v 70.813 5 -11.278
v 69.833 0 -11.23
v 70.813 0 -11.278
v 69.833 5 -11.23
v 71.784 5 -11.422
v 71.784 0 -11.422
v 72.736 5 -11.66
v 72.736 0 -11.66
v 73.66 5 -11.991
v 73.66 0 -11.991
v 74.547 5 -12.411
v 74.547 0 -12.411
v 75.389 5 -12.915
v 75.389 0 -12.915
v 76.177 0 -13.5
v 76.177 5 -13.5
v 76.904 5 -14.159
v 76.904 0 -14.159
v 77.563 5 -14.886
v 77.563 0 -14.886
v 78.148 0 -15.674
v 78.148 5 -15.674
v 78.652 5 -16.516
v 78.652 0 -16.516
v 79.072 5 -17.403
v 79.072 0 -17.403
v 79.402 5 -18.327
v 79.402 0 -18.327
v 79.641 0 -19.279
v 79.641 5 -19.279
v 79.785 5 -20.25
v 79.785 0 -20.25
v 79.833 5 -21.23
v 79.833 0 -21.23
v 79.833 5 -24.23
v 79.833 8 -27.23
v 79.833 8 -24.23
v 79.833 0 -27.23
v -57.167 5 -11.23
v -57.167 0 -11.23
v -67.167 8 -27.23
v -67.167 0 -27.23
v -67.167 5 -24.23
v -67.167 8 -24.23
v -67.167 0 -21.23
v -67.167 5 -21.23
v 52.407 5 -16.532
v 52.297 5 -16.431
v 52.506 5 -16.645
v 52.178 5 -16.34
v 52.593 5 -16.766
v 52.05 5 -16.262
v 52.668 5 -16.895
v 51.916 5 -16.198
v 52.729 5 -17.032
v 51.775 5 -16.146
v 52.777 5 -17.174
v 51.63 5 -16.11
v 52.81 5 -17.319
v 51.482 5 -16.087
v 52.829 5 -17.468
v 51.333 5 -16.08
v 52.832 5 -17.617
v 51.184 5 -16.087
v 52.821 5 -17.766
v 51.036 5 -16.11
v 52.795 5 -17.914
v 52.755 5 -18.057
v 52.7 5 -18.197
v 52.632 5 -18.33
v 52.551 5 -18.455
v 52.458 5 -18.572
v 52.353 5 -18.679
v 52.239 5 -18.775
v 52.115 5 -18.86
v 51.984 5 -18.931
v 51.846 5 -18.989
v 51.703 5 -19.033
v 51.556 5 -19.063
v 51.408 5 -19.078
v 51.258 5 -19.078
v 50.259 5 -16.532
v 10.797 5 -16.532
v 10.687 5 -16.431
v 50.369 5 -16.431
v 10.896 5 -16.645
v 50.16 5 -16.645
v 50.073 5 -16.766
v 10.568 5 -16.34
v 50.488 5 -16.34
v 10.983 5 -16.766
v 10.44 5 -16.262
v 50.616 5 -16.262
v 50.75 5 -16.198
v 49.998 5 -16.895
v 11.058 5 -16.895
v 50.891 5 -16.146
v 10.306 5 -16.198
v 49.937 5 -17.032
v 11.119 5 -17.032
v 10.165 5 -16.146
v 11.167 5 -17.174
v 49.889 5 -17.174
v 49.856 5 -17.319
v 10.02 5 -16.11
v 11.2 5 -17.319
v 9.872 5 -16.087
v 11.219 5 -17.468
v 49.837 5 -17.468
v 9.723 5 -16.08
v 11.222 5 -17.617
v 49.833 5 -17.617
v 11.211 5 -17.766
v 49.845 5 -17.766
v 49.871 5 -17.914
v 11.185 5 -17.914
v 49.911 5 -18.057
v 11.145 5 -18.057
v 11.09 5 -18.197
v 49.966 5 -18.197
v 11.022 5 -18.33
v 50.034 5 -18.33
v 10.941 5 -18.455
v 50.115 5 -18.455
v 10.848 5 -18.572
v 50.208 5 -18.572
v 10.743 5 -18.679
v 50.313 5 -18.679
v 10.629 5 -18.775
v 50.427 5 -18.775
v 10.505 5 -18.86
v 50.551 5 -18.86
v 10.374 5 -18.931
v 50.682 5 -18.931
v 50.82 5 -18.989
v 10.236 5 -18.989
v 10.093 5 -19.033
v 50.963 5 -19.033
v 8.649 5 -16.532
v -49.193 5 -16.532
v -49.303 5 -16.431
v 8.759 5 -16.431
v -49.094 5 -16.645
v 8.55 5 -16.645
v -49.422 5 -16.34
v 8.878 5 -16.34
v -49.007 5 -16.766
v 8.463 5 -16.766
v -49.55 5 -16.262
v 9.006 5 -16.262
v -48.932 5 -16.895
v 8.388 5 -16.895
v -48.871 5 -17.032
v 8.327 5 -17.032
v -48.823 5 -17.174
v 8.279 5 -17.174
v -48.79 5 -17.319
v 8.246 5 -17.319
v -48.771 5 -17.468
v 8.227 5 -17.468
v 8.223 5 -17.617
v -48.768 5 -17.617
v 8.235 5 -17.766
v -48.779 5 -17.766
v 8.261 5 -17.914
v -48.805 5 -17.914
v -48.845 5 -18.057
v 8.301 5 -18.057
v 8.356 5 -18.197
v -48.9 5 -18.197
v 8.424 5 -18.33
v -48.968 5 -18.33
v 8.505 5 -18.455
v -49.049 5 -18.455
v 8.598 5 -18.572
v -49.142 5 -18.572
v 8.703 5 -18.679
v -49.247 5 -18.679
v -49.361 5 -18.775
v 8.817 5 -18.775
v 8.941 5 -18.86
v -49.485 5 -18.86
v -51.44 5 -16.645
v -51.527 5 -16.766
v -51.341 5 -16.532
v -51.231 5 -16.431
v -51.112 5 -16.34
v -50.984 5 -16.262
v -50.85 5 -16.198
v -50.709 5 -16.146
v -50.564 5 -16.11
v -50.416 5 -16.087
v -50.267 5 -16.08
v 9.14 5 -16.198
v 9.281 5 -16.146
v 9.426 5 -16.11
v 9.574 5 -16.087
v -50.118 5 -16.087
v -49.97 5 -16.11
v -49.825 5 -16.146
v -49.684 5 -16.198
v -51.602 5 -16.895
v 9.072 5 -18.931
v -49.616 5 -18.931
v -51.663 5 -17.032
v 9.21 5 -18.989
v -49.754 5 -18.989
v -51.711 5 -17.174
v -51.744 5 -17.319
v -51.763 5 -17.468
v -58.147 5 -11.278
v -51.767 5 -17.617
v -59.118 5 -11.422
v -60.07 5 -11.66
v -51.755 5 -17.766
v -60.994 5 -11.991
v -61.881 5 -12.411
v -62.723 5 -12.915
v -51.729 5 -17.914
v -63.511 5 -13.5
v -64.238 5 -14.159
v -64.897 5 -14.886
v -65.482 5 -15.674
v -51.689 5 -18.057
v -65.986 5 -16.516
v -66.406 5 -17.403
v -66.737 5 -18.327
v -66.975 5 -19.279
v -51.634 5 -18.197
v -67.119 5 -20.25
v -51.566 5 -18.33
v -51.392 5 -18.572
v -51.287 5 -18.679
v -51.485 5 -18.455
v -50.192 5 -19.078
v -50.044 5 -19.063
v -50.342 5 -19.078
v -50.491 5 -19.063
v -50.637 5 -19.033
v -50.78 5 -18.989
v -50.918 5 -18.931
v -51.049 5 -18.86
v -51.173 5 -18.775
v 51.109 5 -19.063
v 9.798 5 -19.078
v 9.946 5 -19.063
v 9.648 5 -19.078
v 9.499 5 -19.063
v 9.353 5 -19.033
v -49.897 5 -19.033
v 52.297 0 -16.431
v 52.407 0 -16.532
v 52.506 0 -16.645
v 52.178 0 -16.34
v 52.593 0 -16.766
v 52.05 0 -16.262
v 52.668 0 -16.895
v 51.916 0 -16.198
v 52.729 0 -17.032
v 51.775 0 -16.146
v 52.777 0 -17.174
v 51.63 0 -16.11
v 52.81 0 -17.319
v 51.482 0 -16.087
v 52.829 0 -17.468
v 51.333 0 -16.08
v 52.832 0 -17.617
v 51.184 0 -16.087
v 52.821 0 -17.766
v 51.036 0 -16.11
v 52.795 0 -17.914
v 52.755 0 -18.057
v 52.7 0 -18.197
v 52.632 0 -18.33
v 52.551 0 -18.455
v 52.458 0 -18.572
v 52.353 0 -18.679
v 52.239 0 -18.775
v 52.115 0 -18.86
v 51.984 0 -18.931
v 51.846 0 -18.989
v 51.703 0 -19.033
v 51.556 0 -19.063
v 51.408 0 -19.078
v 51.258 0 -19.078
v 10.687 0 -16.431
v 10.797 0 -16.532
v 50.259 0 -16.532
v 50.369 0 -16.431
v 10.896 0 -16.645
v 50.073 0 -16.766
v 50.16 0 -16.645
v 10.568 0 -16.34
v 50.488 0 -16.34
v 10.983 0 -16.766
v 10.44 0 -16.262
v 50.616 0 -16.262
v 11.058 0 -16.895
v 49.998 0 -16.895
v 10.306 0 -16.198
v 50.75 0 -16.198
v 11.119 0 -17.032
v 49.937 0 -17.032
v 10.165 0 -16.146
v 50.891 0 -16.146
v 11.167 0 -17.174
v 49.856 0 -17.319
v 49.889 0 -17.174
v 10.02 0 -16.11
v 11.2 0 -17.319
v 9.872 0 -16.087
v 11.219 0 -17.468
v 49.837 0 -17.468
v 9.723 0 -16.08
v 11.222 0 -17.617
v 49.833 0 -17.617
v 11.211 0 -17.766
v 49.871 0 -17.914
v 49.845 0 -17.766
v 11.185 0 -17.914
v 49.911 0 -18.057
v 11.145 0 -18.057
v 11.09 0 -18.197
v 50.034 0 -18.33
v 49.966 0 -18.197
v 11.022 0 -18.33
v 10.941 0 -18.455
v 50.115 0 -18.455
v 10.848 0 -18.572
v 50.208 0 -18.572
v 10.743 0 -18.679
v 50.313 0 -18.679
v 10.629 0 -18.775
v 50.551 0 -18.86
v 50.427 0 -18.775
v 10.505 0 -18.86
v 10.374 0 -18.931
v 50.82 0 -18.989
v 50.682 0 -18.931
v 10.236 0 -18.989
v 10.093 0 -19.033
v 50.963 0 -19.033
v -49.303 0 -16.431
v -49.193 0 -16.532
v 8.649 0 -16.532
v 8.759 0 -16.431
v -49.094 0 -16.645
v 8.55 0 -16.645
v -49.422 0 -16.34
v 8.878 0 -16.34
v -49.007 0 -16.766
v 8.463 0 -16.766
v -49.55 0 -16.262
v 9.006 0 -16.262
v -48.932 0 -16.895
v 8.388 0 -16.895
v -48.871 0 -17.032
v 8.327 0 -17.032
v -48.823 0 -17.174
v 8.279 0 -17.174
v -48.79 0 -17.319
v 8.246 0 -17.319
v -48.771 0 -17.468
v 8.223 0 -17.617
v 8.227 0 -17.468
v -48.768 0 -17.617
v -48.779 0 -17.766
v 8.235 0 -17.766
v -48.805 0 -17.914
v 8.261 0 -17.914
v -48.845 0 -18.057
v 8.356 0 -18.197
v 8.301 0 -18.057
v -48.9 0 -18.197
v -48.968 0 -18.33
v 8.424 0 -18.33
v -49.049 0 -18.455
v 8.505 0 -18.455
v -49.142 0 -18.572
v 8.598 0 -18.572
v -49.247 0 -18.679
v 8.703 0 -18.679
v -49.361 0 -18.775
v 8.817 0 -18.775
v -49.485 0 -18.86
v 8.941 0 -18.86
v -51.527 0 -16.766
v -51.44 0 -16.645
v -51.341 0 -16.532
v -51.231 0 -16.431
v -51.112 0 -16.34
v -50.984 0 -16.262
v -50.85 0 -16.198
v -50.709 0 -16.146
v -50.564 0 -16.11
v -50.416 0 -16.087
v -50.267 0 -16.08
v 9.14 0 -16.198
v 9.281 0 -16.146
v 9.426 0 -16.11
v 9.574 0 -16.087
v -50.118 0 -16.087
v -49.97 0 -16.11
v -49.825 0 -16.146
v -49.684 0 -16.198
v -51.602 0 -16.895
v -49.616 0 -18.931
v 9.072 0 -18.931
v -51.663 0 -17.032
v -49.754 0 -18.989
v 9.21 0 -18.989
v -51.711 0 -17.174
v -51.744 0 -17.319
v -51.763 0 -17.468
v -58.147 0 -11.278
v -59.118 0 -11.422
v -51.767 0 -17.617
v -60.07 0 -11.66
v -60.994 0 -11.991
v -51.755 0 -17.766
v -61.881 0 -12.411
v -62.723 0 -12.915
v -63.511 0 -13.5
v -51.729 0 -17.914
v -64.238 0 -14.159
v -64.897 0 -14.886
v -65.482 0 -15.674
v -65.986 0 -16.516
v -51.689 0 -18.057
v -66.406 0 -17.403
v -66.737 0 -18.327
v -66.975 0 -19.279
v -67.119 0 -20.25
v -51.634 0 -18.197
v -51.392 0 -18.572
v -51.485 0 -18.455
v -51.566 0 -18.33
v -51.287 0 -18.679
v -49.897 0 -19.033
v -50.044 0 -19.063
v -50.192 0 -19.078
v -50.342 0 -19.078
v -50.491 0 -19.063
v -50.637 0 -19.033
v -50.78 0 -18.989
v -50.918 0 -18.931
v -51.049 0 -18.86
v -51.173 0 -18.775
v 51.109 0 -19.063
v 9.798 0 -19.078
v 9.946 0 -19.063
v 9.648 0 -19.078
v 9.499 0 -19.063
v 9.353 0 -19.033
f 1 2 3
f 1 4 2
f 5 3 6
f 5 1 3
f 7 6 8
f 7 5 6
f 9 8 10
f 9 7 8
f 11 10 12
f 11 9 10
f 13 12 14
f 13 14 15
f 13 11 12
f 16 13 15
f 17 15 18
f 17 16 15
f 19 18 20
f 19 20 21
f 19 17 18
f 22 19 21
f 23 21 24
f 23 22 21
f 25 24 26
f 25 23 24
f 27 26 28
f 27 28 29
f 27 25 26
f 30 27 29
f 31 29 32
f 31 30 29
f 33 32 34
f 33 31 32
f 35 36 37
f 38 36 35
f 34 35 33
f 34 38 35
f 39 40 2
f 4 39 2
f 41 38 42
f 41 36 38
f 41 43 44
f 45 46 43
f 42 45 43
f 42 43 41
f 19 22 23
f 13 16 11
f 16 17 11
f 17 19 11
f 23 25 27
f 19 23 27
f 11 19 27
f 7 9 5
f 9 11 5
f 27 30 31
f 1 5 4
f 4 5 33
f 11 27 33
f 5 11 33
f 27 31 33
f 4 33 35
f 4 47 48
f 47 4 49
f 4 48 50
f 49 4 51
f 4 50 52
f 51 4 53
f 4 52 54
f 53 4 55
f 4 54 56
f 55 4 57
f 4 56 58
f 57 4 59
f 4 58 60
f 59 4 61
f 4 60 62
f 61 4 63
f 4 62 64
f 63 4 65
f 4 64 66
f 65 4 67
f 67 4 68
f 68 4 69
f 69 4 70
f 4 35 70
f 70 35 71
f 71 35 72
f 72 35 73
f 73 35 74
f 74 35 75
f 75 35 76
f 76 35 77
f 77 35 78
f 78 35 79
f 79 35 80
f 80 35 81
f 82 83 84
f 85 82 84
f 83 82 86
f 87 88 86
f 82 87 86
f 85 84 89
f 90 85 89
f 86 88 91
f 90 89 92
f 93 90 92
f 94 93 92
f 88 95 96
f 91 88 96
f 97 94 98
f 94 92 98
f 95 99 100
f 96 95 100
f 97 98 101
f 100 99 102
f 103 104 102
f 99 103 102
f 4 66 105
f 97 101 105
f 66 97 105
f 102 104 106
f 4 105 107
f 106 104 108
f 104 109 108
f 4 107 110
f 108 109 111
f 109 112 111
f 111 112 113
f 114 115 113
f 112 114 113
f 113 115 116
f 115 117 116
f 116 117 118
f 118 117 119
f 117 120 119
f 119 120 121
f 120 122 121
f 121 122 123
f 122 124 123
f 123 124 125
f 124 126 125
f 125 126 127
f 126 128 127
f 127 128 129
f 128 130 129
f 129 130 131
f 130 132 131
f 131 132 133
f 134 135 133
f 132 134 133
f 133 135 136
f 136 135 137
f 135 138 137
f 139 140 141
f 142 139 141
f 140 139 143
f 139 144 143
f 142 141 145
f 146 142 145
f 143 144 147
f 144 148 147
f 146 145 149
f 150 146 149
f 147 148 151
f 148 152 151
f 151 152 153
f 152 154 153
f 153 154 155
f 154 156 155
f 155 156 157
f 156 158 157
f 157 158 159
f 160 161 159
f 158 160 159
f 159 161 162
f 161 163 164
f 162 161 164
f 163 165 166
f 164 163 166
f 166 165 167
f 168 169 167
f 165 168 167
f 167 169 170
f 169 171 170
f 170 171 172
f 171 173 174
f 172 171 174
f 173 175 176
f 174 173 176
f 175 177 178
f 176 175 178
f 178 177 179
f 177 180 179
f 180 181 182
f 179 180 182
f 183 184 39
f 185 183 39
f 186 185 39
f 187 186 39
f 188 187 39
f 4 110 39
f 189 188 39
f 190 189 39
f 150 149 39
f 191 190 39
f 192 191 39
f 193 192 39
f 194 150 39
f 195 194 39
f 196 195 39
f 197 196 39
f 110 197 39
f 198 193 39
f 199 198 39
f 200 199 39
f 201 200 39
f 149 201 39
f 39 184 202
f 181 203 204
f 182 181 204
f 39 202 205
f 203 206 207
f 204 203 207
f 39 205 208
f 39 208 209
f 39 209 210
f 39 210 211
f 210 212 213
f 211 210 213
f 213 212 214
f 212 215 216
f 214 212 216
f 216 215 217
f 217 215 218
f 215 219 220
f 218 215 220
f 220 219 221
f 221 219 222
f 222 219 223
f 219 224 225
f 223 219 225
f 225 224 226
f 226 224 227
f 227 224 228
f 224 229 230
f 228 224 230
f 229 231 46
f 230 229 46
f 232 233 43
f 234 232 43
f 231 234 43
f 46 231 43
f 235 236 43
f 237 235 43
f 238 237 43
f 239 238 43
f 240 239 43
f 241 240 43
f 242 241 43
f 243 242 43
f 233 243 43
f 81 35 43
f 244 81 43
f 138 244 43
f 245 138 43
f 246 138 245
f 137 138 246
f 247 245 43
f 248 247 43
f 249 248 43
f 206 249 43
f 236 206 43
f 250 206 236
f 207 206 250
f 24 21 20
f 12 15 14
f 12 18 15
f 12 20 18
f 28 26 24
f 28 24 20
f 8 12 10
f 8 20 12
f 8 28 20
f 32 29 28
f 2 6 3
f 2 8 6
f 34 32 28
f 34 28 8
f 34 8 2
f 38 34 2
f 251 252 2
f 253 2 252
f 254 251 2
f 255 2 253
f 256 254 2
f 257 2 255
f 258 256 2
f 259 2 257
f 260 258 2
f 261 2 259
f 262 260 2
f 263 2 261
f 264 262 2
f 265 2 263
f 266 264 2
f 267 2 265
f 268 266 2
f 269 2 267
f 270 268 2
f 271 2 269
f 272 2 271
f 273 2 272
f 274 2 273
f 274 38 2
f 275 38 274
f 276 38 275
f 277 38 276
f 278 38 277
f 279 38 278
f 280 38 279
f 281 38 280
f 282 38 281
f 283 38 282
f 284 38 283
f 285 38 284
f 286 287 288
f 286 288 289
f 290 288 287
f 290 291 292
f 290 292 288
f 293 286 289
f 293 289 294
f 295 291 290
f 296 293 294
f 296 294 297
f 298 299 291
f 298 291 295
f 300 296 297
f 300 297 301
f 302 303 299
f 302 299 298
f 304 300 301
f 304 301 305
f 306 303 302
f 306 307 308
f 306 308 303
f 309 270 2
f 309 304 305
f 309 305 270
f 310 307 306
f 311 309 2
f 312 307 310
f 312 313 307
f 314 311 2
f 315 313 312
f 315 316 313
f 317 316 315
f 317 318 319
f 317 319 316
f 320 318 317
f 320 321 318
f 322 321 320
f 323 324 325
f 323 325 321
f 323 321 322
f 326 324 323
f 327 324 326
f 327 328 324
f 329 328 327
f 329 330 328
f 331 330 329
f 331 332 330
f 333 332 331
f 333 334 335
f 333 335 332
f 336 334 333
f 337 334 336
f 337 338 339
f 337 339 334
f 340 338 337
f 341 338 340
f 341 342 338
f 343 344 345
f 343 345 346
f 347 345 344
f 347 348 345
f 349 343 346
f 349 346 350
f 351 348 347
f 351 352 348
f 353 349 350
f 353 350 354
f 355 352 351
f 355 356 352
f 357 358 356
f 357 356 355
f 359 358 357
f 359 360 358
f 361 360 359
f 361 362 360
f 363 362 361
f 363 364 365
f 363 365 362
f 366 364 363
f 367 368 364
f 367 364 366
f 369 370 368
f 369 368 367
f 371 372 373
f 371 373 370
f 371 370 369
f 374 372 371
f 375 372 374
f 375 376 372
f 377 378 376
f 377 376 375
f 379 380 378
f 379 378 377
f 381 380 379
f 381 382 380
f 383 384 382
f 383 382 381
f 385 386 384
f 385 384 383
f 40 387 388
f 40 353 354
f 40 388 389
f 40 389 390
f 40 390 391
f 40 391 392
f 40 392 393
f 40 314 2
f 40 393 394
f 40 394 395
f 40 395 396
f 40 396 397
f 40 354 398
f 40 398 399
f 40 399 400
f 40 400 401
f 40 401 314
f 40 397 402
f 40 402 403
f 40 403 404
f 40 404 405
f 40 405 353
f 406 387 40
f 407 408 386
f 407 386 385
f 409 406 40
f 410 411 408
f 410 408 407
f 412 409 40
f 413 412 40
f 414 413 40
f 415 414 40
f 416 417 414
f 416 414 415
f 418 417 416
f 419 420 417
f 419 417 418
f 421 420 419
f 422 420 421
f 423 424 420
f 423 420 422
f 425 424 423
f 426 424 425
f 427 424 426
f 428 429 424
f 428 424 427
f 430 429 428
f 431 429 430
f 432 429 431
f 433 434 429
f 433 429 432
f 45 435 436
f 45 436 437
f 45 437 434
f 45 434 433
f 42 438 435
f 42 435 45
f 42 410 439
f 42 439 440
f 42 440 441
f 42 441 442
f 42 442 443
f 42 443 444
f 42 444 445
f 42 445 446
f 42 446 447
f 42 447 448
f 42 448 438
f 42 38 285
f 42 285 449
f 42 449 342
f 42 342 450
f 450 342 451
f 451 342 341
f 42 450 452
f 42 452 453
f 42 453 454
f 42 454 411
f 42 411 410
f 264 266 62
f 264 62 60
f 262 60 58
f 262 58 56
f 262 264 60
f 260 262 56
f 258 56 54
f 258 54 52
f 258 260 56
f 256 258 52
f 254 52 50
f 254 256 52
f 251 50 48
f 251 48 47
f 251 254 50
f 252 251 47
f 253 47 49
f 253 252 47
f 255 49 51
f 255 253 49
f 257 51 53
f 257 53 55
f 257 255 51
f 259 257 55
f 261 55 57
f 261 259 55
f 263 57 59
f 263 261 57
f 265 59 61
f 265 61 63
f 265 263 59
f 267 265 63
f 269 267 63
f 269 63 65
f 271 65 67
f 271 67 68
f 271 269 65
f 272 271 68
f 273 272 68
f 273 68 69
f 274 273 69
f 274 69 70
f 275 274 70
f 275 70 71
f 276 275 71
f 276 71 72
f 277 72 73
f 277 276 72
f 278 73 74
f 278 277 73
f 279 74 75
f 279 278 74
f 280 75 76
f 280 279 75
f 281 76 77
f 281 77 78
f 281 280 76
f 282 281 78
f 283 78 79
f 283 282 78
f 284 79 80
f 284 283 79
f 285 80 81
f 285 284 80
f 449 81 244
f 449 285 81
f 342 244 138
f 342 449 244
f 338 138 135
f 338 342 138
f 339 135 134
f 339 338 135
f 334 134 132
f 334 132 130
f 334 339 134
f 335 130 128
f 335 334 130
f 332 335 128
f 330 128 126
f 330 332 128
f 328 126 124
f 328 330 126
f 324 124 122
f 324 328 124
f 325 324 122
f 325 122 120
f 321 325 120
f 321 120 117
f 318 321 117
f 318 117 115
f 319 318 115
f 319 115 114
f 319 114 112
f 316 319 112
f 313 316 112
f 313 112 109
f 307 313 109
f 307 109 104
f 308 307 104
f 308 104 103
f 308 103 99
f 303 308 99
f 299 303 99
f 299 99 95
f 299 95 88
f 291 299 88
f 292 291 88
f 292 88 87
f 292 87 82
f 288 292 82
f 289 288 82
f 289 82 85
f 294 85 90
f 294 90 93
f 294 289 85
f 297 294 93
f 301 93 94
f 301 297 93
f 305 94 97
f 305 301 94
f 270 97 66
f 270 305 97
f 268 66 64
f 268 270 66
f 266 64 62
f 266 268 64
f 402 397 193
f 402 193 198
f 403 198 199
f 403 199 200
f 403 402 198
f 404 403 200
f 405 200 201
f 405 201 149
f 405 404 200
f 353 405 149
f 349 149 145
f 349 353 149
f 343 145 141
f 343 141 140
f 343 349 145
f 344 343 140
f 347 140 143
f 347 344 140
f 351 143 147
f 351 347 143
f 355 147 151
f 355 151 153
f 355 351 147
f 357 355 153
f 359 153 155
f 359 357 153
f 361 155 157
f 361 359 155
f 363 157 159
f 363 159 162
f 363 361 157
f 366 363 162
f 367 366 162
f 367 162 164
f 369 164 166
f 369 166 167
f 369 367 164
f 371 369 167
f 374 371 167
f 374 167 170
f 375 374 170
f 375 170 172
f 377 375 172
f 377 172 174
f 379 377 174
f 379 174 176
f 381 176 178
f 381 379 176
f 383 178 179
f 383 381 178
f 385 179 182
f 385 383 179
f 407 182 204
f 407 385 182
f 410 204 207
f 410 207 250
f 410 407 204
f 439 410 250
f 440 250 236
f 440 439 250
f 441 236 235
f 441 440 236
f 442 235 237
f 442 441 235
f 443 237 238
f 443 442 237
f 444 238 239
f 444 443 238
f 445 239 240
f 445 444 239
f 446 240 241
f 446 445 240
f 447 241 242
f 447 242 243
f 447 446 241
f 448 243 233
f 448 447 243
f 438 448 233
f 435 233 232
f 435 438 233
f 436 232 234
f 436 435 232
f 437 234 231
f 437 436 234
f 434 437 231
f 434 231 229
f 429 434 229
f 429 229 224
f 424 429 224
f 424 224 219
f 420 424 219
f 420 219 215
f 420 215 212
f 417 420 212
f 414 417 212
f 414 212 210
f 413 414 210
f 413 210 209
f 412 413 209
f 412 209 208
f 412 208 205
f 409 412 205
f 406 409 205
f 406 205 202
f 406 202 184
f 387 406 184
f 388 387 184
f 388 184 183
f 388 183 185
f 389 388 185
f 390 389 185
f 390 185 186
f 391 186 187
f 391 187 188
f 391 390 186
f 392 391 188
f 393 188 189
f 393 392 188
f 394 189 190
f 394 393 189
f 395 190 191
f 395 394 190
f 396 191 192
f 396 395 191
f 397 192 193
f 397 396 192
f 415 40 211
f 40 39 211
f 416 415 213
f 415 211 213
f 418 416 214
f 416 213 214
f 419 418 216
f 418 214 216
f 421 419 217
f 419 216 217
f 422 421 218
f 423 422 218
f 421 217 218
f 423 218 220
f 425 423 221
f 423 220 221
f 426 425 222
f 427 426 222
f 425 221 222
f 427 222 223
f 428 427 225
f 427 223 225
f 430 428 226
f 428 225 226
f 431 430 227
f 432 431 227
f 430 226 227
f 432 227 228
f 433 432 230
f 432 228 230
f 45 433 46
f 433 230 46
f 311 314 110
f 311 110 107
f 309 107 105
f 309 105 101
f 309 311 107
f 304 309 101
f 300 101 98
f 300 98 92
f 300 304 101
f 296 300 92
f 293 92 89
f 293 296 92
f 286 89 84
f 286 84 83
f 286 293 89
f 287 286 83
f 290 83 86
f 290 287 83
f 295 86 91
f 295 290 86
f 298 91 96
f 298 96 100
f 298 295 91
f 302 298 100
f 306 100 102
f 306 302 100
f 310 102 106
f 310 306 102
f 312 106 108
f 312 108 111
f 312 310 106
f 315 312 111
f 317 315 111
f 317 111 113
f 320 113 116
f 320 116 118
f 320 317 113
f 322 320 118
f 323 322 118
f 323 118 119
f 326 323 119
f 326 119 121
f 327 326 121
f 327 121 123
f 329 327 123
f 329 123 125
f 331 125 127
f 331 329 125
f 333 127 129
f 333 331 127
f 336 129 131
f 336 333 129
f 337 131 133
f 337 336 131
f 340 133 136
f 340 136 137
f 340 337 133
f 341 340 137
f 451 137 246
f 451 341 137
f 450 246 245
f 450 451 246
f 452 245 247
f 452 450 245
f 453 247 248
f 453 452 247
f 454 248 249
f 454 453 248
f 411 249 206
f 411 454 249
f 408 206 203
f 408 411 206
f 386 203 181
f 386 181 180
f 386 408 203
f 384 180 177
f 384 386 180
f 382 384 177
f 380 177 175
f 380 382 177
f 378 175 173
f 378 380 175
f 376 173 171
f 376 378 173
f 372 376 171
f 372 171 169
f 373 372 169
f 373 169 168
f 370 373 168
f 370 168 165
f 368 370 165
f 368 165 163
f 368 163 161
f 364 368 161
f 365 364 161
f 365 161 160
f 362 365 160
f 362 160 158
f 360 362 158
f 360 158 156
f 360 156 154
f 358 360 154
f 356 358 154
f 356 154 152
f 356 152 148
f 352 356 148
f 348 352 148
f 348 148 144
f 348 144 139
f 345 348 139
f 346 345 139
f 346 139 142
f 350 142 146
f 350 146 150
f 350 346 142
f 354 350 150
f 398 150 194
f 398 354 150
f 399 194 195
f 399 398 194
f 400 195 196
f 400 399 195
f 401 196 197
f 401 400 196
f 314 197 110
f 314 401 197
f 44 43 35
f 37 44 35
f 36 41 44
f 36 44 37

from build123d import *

# Parameters (mm, degrees)
SKETCH2_R           = 1.5
BOSS_EXTRUDE1_DEPTH = 5
SKETCH3_W           = 147
SKETCH3_H           = 3
BOSS_EXTRUDE2_DEPTH = 3
FILLET1_R           = 10
FILLET2_R           = 10
SKETCH4_W           = 194.268756053
SKETCH4_H           = 72.725923545
SKETCH4_W_2         = 127
SKETCH4_H_2         = 5
CUT_EXTRUDE1_DEPTH  = 10


with BuildPart() as part:
    # Sketch2 → Boss-Extrude1 (new body)
    with BuildSketch(Plane(origin=(0, 0, 0), x_dir=(1, 0, 0), z_dir=(0, 1, 0))):
        Polygon((79.832898172, 11.229765013), (51.332898172, 11.229765013), (9.722898172, 11.229765013), (-67.167101828, 11.229765013), (-67.167101828, 37.229765013), (79.832898172, 37.229765013), align=None)
        with Locations(Location((9.722898172, 17.579765013, 0), (0, 0, 270))):
            Circle(SKETCH2_R, mode=Mode.SUBTRACT)
        with Locations(Location((51.332898172, 17.579765013, 0), (0, 0, 270))):
            Circle(SKETCH2_R, mode=Mode.SUBTRACT)
        with Locations(Location((-50.267101828, 17.579765013, 0), (0, 0, 270))):
            Circle(SKETCH2_R, mode=Mode.SUBTRACT)
    extrude(amount=BOSS_EXTRUDE1_DEPTH)

    # Sketch3 → Boss-Extrude2 (add)
    with BuildSketch(Plane(origin=(0, 5, 0), x_dir=(1, 0, 0), z_dir=(0, 1, 0))):
        with Locations((6.332898172, 25.729765013)):
            Rectangle(SKETCH3_W, SKETCH3_H)
    extrude(amount=BOSS_EXTRUDE2_DEPTH)

    # Fillet1
    fillet1_edges = [part.edges().sort_by_distance(p)[0] for p in [
        (-67.167101828, 2.5, -37.229765013),
        (-67.167101828, 2.5, -11.229765013),
    ]]
    fillet(fillet1_edges, radius=FILLET1_R)

    # Fillet2
    fillet2_edges = [part.edges().sort_by_distance(p)[0] for p in [
        (79.832898172, 2.5, -37.229765013),
        (79.832898172, 2.5, -11.229765013),
    ]]
    fillet(fillet2_edges, radius=FILLET2_R)

    # Sketch4 → Cut-Extrude1 (cut)
    # profile 1 of 2: a face of its own
    with BuildSketch(Plane(origin=(0, 0, -37.229765013), x_dir=(-1, 0, 0), z_dir=(0, 0, -1))):
        with Locations((1.63687335, -5.593113251)):
            Rectangle(SKETCH4_W, SKETCH4_H)
        with Locations((-6.332898172, 2.5)):
            Rectangle(SKETCH4_W_2, SKETCH4_H_2, mode=Mode.SUBTRACT)
    # profile 2 of 2: a face of its own
    with BuildSketch(Plane(origin=(0, 0, -37.229765013), x_dir=(-1, 0, 0), z_dir=(0, 0, -1))):
        with Locations((-6.332898172, 2.5)):
            Rectangle(SKETCH4_W_2, SKETCH4_H_2)
    extrude(amount=-CUT_EXTRUDE1_DEPTH, mode=Mode.SUBTRACT)


solid = part.part
